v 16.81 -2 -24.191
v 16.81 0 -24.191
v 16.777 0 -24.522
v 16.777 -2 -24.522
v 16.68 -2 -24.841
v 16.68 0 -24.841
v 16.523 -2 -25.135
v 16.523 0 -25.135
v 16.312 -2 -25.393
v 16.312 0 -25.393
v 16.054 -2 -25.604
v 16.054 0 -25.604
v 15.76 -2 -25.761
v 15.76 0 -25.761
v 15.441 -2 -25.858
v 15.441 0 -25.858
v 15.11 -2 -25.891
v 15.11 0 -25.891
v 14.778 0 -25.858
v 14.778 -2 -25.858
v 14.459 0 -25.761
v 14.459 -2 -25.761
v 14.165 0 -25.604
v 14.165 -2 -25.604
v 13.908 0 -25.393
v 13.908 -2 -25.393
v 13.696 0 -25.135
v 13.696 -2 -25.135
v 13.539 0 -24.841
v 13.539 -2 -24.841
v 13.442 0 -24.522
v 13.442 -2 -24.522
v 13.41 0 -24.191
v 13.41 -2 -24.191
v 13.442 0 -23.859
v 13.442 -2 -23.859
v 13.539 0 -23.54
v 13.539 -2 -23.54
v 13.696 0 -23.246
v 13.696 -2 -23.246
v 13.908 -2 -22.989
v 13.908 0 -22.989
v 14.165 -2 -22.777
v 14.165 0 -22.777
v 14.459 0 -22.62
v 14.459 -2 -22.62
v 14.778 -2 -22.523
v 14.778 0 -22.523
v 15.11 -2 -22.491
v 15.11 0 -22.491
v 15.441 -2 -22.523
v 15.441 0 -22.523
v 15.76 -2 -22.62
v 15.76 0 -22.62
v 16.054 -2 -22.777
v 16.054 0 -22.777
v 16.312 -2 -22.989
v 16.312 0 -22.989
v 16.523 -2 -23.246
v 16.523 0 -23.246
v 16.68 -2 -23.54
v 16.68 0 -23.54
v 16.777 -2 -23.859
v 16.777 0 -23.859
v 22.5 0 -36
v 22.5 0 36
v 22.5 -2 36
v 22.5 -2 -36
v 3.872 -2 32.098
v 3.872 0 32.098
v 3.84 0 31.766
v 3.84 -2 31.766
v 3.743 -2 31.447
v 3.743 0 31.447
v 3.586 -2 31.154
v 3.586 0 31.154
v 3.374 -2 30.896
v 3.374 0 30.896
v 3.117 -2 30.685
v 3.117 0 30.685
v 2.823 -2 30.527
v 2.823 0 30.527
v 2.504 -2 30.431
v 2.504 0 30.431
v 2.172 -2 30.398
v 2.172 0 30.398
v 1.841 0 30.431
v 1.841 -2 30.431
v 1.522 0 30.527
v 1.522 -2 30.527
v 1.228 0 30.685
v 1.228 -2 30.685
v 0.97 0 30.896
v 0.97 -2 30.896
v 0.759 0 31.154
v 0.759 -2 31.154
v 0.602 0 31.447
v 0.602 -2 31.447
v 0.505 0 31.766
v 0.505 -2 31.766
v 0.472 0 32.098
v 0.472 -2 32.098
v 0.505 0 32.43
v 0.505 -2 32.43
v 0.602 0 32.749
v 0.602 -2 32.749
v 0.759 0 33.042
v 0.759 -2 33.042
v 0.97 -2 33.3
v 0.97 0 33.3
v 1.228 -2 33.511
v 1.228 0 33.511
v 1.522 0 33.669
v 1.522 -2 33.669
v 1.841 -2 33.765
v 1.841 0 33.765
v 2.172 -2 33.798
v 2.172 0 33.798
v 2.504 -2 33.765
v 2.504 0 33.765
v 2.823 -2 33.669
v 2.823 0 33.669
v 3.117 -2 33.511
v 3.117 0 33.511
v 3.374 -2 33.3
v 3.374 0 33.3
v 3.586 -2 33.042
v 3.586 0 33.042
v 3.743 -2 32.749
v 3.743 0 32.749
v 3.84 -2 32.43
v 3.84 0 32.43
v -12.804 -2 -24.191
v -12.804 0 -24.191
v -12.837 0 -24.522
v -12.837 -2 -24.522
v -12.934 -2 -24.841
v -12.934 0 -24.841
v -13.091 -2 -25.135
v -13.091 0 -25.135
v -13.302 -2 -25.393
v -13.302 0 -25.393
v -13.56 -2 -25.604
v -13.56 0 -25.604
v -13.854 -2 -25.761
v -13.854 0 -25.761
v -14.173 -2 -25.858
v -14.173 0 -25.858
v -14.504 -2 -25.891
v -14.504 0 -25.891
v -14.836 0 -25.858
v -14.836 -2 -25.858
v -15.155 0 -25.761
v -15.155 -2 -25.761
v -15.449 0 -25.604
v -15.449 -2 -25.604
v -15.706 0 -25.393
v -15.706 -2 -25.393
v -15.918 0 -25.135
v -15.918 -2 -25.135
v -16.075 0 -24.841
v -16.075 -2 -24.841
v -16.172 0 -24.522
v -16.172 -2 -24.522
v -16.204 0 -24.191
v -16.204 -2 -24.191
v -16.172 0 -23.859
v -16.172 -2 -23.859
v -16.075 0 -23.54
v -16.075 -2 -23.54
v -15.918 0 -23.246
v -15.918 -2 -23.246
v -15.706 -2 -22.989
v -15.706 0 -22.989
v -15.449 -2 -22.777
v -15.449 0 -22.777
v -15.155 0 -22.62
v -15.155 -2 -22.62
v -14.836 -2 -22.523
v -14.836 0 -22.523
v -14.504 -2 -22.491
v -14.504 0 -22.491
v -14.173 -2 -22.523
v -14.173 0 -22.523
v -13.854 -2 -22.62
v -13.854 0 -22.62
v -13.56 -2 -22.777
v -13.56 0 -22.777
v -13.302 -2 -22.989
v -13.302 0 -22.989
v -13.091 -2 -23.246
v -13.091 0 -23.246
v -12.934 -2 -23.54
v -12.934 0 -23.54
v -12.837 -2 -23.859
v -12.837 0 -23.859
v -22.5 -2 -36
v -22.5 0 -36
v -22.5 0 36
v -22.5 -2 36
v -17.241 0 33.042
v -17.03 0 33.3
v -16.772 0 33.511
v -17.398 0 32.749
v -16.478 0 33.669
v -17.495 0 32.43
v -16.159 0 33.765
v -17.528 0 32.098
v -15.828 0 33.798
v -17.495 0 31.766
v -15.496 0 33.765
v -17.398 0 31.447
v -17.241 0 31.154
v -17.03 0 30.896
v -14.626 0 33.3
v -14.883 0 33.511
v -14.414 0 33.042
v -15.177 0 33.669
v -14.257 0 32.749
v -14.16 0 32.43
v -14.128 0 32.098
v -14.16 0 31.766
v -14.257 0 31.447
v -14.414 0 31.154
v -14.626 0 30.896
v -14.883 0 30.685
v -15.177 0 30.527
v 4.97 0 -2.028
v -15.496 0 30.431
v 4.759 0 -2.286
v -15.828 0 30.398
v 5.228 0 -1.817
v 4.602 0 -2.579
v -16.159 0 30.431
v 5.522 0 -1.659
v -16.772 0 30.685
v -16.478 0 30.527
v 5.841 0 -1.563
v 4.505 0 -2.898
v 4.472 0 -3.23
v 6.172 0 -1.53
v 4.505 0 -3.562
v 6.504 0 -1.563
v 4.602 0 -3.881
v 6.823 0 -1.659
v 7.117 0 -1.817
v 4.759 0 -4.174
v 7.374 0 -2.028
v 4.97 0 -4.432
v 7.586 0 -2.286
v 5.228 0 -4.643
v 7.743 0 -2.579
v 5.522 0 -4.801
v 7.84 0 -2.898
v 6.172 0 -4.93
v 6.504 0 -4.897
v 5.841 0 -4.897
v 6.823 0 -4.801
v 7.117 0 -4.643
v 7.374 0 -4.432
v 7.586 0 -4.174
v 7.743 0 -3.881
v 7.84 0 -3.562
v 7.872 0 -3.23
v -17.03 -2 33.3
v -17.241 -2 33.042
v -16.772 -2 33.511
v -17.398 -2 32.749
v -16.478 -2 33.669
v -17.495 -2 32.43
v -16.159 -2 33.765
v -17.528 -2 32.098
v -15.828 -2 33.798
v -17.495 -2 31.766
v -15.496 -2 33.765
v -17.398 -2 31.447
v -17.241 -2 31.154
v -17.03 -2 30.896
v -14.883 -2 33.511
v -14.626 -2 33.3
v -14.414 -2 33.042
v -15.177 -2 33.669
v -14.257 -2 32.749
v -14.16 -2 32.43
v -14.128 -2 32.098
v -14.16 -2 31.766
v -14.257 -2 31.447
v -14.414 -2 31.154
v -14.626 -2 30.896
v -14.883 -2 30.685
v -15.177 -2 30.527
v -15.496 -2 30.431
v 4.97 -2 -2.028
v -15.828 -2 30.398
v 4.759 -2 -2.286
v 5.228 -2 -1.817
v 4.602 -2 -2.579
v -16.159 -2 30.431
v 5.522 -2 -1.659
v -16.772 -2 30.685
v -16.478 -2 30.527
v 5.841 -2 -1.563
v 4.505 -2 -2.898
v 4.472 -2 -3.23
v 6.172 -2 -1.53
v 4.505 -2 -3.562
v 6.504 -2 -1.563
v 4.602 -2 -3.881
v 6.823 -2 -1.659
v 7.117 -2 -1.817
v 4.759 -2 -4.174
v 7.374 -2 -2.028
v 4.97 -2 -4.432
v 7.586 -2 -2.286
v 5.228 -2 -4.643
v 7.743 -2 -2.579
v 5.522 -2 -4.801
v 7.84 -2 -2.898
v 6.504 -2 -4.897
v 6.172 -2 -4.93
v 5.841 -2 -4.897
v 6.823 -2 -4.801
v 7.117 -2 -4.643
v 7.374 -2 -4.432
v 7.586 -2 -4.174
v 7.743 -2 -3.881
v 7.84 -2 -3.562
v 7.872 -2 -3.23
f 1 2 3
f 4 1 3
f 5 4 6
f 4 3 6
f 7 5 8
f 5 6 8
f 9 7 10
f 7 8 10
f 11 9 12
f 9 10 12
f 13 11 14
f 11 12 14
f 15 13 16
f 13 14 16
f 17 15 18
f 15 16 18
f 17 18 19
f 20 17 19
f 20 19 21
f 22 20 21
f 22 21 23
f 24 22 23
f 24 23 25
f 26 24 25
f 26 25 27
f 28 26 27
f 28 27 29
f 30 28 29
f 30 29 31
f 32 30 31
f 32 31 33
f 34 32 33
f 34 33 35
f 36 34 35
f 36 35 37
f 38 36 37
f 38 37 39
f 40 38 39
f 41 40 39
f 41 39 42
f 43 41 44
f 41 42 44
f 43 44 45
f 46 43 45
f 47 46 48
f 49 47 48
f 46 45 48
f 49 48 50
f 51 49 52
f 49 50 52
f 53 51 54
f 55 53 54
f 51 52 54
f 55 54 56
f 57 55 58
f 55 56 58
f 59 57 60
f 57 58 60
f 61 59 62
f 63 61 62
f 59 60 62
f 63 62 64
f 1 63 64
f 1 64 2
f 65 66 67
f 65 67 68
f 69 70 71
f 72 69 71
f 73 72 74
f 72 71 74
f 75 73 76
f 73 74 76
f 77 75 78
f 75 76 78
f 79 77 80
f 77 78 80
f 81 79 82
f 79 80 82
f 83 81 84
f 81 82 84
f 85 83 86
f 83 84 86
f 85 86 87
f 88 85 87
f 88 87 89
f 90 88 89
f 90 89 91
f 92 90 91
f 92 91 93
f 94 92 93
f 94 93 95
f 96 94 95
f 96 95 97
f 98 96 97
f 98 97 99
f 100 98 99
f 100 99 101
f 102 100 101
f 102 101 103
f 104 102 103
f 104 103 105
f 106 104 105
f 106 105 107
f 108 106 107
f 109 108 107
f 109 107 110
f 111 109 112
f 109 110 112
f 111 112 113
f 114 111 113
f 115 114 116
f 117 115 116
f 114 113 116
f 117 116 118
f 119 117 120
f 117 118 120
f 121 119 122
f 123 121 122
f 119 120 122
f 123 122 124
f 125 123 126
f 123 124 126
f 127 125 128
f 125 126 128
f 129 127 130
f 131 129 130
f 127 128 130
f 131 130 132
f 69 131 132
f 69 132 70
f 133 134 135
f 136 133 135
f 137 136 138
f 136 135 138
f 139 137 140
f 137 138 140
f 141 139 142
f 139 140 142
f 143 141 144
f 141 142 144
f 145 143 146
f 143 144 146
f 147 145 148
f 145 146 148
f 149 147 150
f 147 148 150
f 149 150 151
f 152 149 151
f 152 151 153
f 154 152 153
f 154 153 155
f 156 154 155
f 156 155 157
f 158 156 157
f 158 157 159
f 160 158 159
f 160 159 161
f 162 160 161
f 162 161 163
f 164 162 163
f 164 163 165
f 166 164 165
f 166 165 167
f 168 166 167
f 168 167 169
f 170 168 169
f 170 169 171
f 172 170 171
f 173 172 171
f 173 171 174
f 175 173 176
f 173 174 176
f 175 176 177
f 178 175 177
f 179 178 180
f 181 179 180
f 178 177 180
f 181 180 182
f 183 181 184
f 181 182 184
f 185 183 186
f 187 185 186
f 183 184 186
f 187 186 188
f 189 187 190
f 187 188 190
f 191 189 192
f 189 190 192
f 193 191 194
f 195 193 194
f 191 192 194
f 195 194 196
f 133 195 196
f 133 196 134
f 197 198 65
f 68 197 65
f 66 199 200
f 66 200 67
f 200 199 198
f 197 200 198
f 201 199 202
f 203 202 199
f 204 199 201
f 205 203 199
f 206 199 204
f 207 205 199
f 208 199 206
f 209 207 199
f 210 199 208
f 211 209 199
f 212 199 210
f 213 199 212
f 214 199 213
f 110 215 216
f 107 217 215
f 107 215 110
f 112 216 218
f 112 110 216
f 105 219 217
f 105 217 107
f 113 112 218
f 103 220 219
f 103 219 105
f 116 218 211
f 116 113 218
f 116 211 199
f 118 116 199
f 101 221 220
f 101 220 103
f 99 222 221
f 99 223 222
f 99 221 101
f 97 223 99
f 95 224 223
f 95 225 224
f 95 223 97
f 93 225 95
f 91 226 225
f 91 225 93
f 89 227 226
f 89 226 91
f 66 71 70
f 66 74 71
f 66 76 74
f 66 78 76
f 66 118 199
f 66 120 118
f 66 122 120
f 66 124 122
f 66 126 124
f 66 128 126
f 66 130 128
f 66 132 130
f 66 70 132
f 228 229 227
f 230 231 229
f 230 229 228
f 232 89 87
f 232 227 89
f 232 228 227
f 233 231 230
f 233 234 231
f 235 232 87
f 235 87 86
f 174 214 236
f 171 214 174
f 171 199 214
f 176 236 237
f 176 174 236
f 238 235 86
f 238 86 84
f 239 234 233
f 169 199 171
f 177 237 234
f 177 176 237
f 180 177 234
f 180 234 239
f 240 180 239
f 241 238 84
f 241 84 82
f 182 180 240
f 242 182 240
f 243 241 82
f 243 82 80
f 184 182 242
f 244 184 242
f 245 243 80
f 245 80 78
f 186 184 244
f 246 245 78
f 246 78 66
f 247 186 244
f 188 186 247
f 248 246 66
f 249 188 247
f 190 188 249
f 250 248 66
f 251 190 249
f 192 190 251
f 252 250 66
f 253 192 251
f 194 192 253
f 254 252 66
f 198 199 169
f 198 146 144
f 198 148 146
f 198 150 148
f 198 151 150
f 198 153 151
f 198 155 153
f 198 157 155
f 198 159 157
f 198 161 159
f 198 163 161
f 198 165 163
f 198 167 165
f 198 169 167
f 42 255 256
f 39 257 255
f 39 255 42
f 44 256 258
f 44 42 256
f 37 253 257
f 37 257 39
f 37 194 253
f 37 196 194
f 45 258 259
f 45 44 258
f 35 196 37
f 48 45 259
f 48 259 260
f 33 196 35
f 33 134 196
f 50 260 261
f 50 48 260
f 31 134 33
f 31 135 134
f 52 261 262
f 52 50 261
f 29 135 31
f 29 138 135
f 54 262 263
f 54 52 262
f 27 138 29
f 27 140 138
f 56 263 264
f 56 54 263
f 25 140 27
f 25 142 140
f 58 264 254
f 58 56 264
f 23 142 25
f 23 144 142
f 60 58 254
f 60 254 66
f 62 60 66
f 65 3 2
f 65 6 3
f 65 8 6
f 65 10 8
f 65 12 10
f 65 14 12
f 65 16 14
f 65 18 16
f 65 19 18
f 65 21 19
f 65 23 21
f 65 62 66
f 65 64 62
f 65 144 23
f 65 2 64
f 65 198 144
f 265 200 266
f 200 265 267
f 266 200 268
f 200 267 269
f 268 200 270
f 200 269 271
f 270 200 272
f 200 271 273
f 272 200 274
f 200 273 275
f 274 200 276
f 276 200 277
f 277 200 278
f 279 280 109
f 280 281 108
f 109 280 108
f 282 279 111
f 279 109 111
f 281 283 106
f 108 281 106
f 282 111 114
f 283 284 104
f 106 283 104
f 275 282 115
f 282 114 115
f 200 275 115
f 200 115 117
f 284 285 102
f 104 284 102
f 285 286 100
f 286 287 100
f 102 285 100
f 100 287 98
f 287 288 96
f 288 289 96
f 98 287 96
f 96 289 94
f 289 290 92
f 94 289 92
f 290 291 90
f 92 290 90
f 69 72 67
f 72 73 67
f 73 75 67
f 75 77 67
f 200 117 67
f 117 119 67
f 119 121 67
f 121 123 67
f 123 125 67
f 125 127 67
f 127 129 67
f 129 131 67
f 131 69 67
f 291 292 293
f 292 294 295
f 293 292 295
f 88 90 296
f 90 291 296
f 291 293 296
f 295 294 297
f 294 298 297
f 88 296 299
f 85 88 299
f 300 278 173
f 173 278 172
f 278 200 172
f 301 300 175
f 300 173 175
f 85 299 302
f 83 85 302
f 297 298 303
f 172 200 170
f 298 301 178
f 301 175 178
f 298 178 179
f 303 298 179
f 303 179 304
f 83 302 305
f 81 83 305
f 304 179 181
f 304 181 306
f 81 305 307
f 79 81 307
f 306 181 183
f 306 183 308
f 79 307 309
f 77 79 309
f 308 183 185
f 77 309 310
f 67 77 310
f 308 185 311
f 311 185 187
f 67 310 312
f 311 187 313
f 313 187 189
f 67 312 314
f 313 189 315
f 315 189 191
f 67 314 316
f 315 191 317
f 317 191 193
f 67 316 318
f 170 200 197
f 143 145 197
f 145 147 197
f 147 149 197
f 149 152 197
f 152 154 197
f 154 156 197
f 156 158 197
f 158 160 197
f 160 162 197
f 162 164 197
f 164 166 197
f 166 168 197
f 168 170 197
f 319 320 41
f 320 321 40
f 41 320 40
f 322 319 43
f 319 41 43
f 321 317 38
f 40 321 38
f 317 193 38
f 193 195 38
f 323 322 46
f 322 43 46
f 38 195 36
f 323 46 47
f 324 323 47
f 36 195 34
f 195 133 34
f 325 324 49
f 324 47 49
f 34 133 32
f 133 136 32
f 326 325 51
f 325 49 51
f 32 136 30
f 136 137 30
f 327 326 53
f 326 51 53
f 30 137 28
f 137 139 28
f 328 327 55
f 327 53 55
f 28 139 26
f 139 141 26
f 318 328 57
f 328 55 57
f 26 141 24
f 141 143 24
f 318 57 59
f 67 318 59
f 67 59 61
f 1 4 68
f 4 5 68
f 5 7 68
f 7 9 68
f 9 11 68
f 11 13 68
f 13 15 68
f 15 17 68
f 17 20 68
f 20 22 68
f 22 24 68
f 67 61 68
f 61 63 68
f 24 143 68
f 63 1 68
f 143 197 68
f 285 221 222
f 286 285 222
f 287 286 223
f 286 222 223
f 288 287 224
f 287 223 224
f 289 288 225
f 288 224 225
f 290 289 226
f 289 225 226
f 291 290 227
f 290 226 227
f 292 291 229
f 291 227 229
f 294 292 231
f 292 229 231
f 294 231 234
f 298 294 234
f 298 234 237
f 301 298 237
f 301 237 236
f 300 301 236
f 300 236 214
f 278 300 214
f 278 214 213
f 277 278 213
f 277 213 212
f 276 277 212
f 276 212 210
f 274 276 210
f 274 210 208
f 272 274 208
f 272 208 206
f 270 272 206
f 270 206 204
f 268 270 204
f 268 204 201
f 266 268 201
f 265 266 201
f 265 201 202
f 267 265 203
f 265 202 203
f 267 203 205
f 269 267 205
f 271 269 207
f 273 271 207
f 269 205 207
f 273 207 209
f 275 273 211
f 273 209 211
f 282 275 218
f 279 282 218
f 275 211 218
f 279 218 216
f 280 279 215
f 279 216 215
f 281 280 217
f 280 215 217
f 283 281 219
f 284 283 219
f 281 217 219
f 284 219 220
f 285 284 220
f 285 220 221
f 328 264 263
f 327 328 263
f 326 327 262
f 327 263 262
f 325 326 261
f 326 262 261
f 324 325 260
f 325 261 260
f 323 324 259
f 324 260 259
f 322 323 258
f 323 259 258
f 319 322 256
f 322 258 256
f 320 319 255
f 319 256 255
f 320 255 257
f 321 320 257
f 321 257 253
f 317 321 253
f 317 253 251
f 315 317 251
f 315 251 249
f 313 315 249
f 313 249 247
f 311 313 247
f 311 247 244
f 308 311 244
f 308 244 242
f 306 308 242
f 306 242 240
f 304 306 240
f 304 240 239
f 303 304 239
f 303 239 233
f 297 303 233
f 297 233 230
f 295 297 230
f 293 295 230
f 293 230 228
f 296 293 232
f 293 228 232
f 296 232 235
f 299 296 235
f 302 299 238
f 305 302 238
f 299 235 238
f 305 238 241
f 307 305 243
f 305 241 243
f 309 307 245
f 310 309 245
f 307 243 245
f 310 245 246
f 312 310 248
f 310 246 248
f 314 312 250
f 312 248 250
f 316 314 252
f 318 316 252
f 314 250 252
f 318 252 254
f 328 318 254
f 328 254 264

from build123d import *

# Parameters (mm, degrees)
SKETCH1_W                = 45
SKETCH1_H                = 72
BASE_FLANGE1_DEPTH       = 2
NEED_TO_REPOSITION_D     = 3.4
NEED_TO_REPOSITION_DEPTH = 12
NEED_TO_REPOSITION_TIP   = 1.021463052


# Sheet-metal steps are written as plain solids
with BuildPart() as part:
    # Sketch1 → Base-Flange1 (new body)
    with BuildSketch(Plane(origin=(0, 0, 0), x_dir=(1, 0, 0), z_dir=(0, 1, 0))):
        Rectangle(SKETCH1_W, SKETCH1_H)
    extrude(amount=-BASE_FLANGE1_DEPTH)

    # Need to Reposition
    with Locations(Plane(origin=(0, -2, 0), x_dir=(-1, 0, 0), z_dir=(0, -1, 0))):
        with Locations((-2.172321578, -32.098), (15.827678422, -32.098), (-6.172321578, 3.23), (-15.109631715, 24.190770957), (14.504316145, 24.190770957)):
            Hole(NEED_TO_REPOSITION_D / 2, depth=NEED_TO_REPOSITION_DEPTH)
            with Locations((0, 0, -(NEED_TO_REPOSITION_DEPTH + NEED_TO_REPOSITION_TIP / 2))):  # 118° drill point
                Cone(0, NEED_TO_REPOSITION_D / 2, NEED_TO_REPOSITION_TIP, mode=Mode.SUBTRACT)


solid = part.part
